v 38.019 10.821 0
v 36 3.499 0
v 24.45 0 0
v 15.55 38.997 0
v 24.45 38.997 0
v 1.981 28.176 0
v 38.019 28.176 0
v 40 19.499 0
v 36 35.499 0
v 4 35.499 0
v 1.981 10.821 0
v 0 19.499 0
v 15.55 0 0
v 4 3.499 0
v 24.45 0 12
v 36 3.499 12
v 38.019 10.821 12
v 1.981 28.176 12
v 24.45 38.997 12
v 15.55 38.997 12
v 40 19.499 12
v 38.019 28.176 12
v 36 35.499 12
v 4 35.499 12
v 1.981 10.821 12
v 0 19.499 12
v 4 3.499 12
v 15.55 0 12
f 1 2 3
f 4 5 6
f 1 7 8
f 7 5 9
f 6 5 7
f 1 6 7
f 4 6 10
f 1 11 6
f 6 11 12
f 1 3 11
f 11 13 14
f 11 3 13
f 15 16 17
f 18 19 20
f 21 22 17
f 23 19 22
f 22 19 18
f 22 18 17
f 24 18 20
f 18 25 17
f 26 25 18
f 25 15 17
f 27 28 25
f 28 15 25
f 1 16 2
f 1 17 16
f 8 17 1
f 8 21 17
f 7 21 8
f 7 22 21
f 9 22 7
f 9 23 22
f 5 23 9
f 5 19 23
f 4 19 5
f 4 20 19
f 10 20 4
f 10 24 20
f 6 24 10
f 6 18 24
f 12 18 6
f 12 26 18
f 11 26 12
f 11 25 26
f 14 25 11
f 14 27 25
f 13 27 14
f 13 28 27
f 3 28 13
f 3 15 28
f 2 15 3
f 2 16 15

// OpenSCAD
$fn = 32;

// ----------------------------------------------------------------------
// Flat adaptor: hex_disc, 12 mm thick
// ----------------------------------------------------------------------

// --- parameters (mm) ---
profile_height = 12;      // extrusion height
profile_points = 14;      // points of the closed outline

profile = [[0, 19.499], [1.981, 10.821], [4, 3.499], [15.55, 0], [24.45, 0], [36, 3.499], [38.019, 10.821], [40, 19.499], [38.019, 28.176], [36, 35.499], [24.45, 38.997], [15.55, 38.997], [4, 35.499], [1.981, 28.176]];  // single closed polygon, 14 points, counter clockwise

// --- the one profile operation ---
linear_extrude(height = profile_height) polygon(points = profile);
